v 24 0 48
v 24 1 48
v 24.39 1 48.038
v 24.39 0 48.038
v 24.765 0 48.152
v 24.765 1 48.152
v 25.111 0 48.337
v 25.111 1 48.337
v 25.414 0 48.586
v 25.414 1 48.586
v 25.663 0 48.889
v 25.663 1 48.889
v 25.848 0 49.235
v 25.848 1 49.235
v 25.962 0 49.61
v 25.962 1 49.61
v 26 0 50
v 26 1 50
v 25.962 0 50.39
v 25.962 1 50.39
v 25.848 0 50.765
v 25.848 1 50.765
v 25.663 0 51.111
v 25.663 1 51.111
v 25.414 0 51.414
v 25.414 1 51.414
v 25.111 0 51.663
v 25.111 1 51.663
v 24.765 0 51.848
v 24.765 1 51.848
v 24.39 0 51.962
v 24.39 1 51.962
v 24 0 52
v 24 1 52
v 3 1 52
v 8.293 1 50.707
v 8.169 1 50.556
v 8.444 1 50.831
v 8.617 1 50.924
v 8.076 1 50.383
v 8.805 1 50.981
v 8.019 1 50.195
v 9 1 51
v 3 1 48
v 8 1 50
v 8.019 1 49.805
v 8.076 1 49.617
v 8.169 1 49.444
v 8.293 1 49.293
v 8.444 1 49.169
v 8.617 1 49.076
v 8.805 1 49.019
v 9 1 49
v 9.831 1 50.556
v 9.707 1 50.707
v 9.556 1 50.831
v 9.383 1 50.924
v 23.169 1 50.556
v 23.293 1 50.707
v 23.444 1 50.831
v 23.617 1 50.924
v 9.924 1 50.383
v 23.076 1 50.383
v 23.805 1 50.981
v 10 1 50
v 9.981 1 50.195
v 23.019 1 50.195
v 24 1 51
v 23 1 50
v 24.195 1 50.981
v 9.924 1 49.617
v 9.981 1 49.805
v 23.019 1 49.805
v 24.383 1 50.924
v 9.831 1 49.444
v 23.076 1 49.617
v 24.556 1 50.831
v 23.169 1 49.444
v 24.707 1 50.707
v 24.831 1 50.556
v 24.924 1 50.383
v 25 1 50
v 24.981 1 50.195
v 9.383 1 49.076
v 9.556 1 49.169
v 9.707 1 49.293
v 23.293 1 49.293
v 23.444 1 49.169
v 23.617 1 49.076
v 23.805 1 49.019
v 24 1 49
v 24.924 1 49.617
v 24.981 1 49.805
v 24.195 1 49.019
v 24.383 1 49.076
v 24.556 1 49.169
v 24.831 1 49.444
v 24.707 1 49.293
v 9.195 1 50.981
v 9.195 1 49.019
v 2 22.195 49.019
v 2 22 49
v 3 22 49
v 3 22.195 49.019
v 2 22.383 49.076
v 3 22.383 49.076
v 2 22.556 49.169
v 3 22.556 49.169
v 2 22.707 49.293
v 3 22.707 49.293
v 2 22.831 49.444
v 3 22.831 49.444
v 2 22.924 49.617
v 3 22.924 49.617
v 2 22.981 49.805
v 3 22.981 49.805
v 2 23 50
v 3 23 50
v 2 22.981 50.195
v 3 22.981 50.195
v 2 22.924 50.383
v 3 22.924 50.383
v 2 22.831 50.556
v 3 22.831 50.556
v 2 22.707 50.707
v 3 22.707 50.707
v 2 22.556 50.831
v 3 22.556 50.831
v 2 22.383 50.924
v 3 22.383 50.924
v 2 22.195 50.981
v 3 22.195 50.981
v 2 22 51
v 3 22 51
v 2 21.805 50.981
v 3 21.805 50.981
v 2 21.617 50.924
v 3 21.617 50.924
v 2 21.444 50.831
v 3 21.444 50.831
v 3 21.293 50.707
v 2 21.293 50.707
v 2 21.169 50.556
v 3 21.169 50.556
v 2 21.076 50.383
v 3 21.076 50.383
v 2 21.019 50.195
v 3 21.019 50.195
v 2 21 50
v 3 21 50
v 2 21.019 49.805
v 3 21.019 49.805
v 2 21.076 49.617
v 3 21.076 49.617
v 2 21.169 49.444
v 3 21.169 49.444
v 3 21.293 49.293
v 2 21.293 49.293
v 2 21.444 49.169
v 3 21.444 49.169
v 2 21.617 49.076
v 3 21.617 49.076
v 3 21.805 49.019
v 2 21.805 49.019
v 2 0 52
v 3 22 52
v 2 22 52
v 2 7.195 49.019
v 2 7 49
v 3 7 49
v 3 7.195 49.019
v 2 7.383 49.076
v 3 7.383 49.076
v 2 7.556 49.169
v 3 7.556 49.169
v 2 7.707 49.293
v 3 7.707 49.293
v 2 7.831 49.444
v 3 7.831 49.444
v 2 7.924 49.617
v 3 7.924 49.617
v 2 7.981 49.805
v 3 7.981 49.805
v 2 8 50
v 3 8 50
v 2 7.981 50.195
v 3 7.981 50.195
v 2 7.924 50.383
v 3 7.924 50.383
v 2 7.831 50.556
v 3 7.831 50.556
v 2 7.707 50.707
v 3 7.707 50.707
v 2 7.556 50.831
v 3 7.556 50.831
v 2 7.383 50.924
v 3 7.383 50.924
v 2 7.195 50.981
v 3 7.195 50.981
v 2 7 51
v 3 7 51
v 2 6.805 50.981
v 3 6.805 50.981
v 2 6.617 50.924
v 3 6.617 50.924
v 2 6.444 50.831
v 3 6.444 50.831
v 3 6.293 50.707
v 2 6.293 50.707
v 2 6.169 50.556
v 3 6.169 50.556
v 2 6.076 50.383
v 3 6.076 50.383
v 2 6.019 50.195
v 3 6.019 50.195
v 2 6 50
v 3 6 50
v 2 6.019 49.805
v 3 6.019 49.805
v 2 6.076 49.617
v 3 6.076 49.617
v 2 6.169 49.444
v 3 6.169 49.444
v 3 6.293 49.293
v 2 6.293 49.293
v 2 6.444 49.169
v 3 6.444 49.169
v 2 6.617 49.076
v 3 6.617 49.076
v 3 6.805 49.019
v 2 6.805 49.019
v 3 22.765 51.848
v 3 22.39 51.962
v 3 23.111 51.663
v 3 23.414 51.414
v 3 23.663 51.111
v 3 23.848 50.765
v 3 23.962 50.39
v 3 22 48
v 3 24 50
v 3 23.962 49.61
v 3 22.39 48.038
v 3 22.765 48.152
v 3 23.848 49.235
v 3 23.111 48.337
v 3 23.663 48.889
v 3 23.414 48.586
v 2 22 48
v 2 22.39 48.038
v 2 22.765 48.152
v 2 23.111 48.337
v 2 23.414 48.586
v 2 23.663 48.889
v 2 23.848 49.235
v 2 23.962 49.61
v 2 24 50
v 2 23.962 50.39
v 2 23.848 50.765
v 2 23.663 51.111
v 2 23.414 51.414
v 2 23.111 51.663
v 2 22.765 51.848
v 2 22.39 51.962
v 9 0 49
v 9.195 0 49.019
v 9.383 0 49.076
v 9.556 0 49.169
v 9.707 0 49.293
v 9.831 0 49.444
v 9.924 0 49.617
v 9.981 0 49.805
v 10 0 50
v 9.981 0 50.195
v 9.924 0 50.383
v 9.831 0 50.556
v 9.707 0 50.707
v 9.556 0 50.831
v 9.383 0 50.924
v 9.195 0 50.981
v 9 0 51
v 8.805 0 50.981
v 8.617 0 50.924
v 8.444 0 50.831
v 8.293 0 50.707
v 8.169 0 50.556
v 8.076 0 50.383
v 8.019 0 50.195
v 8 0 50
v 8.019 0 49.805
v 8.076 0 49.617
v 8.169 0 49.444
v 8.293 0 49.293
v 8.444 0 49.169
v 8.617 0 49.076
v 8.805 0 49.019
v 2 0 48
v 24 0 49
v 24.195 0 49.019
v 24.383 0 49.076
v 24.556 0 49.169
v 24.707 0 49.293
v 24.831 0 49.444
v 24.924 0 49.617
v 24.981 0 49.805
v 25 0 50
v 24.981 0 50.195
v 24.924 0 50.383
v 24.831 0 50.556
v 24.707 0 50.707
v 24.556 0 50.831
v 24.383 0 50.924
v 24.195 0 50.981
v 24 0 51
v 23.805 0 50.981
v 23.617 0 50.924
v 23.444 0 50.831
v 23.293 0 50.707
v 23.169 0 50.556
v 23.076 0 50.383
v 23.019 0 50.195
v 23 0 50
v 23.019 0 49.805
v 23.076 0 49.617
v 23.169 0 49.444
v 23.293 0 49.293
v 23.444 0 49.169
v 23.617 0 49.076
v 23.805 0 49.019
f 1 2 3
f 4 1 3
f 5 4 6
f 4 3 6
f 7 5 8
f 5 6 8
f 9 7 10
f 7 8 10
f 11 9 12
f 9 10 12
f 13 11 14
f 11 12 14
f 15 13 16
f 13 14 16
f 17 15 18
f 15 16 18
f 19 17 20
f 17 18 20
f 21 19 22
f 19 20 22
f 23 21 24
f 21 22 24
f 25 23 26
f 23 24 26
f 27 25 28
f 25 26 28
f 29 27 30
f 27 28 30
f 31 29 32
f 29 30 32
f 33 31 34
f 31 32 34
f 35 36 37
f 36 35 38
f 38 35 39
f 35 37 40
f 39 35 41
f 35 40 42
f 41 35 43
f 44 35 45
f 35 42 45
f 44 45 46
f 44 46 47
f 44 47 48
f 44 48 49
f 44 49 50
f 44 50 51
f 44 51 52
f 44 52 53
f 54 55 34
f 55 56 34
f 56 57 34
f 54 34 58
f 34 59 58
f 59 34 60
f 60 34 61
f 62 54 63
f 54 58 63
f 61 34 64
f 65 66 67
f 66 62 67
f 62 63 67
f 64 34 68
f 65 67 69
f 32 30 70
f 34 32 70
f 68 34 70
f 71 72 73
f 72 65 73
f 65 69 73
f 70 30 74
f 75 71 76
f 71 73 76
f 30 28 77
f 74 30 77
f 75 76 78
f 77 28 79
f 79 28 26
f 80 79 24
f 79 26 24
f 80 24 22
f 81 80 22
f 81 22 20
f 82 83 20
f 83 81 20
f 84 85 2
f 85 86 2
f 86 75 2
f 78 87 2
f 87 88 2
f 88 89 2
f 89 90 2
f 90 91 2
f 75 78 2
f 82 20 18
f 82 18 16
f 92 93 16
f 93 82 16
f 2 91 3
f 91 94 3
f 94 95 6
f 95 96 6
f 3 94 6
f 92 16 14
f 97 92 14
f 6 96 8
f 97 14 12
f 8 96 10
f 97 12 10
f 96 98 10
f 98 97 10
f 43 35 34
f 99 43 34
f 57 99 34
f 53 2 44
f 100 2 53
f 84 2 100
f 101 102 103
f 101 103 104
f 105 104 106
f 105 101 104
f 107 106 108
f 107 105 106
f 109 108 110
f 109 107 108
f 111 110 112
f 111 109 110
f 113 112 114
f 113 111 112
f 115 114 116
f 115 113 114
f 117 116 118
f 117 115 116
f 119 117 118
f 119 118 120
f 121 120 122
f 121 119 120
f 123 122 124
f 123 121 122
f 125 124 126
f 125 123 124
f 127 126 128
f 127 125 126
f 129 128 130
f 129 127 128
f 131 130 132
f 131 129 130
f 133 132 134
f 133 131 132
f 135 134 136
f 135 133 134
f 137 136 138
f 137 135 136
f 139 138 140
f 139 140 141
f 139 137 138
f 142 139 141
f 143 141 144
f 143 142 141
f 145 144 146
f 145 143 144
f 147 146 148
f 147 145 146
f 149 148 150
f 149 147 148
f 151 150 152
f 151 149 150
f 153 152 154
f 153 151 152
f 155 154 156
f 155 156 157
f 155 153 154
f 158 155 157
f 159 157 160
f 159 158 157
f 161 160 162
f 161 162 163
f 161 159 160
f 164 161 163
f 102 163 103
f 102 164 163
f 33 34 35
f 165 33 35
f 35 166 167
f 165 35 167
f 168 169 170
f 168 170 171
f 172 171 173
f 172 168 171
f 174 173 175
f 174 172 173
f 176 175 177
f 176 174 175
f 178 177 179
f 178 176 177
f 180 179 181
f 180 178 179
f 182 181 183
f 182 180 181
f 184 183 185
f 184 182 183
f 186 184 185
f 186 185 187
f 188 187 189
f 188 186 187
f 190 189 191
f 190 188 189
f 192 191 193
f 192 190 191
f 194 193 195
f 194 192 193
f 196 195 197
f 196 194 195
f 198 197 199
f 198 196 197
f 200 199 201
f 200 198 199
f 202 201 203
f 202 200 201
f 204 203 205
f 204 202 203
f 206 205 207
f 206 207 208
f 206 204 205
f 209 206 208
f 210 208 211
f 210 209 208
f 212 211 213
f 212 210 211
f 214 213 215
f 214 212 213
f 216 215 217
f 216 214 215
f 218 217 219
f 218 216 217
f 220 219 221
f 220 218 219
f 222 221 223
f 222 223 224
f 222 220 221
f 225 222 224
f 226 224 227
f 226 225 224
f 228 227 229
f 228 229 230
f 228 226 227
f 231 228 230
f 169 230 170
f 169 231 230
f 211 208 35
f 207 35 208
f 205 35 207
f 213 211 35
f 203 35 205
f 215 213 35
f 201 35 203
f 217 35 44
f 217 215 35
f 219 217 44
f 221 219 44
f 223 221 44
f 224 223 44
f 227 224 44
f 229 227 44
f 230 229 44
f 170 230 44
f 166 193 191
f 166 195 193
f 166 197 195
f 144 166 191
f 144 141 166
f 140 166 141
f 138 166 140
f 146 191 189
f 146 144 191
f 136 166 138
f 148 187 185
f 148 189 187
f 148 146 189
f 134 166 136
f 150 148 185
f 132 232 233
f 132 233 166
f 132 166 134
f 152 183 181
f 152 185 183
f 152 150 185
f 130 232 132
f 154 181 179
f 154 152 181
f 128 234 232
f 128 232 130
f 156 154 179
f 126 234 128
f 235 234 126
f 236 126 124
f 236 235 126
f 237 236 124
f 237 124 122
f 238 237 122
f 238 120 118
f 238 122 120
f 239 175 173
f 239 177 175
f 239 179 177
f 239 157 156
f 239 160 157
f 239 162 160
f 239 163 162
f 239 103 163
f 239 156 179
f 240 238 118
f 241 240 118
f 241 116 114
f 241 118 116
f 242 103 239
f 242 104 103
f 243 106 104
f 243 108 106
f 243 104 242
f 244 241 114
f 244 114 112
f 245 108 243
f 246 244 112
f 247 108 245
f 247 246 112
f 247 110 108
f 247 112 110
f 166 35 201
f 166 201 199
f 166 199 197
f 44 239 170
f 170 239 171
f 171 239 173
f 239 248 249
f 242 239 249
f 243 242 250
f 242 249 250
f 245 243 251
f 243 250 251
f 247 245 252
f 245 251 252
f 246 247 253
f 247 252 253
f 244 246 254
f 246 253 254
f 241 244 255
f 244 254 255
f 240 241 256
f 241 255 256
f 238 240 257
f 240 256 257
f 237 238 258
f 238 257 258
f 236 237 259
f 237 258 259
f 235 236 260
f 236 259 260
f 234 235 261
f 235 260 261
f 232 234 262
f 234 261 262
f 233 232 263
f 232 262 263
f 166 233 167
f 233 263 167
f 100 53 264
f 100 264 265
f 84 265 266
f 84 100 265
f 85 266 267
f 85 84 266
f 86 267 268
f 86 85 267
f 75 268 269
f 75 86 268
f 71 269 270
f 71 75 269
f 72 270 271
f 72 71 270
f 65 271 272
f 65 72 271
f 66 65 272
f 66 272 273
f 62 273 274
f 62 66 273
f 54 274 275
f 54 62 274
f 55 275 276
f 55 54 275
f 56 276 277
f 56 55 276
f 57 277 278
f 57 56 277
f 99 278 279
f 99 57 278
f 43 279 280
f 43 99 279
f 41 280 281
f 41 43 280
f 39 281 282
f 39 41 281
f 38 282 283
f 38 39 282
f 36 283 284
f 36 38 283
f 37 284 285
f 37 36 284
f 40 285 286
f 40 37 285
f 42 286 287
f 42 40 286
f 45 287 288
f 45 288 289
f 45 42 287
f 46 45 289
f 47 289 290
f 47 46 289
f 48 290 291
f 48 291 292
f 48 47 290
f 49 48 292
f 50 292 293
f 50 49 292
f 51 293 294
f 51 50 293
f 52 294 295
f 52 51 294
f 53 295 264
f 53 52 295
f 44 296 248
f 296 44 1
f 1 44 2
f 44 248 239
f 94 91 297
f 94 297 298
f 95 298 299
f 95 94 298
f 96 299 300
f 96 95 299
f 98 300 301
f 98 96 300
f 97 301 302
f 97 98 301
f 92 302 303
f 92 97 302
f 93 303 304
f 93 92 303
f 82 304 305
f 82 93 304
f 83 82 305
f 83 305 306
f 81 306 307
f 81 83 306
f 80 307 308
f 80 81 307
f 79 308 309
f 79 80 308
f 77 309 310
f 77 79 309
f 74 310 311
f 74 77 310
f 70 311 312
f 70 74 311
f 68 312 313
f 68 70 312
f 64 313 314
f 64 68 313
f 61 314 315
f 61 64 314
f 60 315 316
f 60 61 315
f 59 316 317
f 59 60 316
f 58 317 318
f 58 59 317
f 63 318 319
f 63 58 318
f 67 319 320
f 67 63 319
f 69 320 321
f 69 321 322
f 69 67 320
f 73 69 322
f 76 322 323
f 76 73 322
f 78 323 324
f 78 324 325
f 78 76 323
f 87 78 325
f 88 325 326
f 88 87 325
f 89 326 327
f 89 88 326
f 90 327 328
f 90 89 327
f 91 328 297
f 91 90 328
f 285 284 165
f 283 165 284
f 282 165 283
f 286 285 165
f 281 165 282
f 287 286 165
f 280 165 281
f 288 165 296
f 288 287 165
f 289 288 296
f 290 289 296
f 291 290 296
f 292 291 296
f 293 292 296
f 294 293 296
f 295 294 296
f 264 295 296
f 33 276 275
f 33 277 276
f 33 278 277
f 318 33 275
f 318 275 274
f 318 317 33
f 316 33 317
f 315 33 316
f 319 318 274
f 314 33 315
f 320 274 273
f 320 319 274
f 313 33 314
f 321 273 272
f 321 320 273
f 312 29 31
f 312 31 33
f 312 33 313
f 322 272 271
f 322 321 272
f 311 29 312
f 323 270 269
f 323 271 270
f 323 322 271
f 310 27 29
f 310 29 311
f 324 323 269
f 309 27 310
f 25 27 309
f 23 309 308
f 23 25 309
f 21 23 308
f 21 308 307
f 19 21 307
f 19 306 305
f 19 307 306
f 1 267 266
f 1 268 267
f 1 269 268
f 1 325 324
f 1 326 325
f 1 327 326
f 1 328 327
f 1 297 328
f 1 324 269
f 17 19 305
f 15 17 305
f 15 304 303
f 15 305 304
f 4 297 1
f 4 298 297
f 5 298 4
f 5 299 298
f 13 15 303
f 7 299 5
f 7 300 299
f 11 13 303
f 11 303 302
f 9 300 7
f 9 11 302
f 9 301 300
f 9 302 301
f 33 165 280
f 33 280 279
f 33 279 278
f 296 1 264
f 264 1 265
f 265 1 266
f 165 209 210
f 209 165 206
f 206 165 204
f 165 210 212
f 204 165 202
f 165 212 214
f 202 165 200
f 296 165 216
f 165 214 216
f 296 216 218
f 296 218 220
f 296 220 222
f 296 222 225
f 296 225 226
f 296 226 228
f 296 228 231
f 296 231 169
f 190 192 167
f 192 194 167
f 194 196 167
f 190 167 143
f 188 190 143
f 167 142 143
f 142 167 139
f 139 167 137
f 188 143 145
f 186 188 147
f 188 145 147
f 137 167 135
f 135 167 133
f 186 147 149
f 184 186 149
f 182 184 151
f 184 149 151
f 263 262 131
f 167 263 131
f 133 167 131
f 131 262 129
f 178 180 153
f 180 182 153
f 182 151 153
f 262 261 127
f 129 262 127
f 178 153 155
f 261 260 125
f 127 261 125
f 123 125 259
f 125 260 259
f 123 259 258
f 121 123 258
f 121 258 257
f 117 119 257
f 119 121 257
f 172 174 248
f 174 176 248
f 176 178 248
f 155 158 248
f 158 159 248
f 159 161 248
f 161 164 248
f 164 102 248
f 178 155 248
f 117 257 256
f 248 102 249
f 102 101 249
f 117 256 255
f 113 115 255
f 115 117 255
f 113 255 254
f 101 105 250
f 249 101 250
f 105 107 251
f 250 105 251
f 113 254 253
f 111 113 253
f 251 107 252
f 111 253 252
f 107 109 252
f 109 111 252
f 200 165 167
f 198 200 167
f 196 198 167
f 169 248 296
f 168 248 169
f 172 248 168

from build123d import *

# Parameters (mm, degrees)
SKETCH115_R            = 1
PAD074_DEPTH           = 1
SKETCH116_R            = 1
PAD075_DEPTH           = 1
FUSION_PLACEMENT_ANGLE = 90


with BuildPart() as flat:
    # Sketch115 → Pad074 (new body)
    with BuildSketch(Plane.XY):
        with BuildLine():
            Line((0, 22), (0, 0))
            Line((0, 0), (4, 0))
            Line((4, 0), (4, 22))
            ThreePointArc((4, 22), (2, 24), (0, 22))
        make_face()
        with Locations((2, 22)):
            Circle(SKETCH115_R, mode=Mode.SUBTRACT)
        with Locations((2, 7)):
            Circle(SKETCH115_R, mode=Mode.SUBTRACT)
    extrude(amount=PAD074_DEPTH)


with BuildPart() as high:
    # Pad075 base: copy of Flat
    add(flat.part)

    # Sketch116 → Pad075 (new body)
    with BuildSketch(Plane.XZ.offset(-1)):
        with BuildLine():
            Line((0, 22), (0, 0))
            Line((0, 0), (4, 0))
            Line((4, 0), (4, 22))
            ThreePointArc((4, 22), (2, 24), (0, 22))
        make_face()
        with Locations((2, 22)):
            Circle(SKETCH116_R, mode=Mode.SUBTRACT)
        with Locations((2, 7)):
            Circle(SKETCH116_R, mode=Mode.SUBTRACT)
    extrude(amount=PAD075_DEPTH)


with BuildPart() as fusion:
    # Fusion base: copy of Flat
    add(flat.part)

    # Fusion: union High
    add(high.part)


with BuildPart() as fusion_1:
    # Fusion placement: moved
    add(fusion.part.moved(Location((2, 0, 52))).rotate(Axis((2, 0, 52), (0, 1, 0)), FUSION_PLACEMENT_ANGLE))


solid = fusion_1.part
